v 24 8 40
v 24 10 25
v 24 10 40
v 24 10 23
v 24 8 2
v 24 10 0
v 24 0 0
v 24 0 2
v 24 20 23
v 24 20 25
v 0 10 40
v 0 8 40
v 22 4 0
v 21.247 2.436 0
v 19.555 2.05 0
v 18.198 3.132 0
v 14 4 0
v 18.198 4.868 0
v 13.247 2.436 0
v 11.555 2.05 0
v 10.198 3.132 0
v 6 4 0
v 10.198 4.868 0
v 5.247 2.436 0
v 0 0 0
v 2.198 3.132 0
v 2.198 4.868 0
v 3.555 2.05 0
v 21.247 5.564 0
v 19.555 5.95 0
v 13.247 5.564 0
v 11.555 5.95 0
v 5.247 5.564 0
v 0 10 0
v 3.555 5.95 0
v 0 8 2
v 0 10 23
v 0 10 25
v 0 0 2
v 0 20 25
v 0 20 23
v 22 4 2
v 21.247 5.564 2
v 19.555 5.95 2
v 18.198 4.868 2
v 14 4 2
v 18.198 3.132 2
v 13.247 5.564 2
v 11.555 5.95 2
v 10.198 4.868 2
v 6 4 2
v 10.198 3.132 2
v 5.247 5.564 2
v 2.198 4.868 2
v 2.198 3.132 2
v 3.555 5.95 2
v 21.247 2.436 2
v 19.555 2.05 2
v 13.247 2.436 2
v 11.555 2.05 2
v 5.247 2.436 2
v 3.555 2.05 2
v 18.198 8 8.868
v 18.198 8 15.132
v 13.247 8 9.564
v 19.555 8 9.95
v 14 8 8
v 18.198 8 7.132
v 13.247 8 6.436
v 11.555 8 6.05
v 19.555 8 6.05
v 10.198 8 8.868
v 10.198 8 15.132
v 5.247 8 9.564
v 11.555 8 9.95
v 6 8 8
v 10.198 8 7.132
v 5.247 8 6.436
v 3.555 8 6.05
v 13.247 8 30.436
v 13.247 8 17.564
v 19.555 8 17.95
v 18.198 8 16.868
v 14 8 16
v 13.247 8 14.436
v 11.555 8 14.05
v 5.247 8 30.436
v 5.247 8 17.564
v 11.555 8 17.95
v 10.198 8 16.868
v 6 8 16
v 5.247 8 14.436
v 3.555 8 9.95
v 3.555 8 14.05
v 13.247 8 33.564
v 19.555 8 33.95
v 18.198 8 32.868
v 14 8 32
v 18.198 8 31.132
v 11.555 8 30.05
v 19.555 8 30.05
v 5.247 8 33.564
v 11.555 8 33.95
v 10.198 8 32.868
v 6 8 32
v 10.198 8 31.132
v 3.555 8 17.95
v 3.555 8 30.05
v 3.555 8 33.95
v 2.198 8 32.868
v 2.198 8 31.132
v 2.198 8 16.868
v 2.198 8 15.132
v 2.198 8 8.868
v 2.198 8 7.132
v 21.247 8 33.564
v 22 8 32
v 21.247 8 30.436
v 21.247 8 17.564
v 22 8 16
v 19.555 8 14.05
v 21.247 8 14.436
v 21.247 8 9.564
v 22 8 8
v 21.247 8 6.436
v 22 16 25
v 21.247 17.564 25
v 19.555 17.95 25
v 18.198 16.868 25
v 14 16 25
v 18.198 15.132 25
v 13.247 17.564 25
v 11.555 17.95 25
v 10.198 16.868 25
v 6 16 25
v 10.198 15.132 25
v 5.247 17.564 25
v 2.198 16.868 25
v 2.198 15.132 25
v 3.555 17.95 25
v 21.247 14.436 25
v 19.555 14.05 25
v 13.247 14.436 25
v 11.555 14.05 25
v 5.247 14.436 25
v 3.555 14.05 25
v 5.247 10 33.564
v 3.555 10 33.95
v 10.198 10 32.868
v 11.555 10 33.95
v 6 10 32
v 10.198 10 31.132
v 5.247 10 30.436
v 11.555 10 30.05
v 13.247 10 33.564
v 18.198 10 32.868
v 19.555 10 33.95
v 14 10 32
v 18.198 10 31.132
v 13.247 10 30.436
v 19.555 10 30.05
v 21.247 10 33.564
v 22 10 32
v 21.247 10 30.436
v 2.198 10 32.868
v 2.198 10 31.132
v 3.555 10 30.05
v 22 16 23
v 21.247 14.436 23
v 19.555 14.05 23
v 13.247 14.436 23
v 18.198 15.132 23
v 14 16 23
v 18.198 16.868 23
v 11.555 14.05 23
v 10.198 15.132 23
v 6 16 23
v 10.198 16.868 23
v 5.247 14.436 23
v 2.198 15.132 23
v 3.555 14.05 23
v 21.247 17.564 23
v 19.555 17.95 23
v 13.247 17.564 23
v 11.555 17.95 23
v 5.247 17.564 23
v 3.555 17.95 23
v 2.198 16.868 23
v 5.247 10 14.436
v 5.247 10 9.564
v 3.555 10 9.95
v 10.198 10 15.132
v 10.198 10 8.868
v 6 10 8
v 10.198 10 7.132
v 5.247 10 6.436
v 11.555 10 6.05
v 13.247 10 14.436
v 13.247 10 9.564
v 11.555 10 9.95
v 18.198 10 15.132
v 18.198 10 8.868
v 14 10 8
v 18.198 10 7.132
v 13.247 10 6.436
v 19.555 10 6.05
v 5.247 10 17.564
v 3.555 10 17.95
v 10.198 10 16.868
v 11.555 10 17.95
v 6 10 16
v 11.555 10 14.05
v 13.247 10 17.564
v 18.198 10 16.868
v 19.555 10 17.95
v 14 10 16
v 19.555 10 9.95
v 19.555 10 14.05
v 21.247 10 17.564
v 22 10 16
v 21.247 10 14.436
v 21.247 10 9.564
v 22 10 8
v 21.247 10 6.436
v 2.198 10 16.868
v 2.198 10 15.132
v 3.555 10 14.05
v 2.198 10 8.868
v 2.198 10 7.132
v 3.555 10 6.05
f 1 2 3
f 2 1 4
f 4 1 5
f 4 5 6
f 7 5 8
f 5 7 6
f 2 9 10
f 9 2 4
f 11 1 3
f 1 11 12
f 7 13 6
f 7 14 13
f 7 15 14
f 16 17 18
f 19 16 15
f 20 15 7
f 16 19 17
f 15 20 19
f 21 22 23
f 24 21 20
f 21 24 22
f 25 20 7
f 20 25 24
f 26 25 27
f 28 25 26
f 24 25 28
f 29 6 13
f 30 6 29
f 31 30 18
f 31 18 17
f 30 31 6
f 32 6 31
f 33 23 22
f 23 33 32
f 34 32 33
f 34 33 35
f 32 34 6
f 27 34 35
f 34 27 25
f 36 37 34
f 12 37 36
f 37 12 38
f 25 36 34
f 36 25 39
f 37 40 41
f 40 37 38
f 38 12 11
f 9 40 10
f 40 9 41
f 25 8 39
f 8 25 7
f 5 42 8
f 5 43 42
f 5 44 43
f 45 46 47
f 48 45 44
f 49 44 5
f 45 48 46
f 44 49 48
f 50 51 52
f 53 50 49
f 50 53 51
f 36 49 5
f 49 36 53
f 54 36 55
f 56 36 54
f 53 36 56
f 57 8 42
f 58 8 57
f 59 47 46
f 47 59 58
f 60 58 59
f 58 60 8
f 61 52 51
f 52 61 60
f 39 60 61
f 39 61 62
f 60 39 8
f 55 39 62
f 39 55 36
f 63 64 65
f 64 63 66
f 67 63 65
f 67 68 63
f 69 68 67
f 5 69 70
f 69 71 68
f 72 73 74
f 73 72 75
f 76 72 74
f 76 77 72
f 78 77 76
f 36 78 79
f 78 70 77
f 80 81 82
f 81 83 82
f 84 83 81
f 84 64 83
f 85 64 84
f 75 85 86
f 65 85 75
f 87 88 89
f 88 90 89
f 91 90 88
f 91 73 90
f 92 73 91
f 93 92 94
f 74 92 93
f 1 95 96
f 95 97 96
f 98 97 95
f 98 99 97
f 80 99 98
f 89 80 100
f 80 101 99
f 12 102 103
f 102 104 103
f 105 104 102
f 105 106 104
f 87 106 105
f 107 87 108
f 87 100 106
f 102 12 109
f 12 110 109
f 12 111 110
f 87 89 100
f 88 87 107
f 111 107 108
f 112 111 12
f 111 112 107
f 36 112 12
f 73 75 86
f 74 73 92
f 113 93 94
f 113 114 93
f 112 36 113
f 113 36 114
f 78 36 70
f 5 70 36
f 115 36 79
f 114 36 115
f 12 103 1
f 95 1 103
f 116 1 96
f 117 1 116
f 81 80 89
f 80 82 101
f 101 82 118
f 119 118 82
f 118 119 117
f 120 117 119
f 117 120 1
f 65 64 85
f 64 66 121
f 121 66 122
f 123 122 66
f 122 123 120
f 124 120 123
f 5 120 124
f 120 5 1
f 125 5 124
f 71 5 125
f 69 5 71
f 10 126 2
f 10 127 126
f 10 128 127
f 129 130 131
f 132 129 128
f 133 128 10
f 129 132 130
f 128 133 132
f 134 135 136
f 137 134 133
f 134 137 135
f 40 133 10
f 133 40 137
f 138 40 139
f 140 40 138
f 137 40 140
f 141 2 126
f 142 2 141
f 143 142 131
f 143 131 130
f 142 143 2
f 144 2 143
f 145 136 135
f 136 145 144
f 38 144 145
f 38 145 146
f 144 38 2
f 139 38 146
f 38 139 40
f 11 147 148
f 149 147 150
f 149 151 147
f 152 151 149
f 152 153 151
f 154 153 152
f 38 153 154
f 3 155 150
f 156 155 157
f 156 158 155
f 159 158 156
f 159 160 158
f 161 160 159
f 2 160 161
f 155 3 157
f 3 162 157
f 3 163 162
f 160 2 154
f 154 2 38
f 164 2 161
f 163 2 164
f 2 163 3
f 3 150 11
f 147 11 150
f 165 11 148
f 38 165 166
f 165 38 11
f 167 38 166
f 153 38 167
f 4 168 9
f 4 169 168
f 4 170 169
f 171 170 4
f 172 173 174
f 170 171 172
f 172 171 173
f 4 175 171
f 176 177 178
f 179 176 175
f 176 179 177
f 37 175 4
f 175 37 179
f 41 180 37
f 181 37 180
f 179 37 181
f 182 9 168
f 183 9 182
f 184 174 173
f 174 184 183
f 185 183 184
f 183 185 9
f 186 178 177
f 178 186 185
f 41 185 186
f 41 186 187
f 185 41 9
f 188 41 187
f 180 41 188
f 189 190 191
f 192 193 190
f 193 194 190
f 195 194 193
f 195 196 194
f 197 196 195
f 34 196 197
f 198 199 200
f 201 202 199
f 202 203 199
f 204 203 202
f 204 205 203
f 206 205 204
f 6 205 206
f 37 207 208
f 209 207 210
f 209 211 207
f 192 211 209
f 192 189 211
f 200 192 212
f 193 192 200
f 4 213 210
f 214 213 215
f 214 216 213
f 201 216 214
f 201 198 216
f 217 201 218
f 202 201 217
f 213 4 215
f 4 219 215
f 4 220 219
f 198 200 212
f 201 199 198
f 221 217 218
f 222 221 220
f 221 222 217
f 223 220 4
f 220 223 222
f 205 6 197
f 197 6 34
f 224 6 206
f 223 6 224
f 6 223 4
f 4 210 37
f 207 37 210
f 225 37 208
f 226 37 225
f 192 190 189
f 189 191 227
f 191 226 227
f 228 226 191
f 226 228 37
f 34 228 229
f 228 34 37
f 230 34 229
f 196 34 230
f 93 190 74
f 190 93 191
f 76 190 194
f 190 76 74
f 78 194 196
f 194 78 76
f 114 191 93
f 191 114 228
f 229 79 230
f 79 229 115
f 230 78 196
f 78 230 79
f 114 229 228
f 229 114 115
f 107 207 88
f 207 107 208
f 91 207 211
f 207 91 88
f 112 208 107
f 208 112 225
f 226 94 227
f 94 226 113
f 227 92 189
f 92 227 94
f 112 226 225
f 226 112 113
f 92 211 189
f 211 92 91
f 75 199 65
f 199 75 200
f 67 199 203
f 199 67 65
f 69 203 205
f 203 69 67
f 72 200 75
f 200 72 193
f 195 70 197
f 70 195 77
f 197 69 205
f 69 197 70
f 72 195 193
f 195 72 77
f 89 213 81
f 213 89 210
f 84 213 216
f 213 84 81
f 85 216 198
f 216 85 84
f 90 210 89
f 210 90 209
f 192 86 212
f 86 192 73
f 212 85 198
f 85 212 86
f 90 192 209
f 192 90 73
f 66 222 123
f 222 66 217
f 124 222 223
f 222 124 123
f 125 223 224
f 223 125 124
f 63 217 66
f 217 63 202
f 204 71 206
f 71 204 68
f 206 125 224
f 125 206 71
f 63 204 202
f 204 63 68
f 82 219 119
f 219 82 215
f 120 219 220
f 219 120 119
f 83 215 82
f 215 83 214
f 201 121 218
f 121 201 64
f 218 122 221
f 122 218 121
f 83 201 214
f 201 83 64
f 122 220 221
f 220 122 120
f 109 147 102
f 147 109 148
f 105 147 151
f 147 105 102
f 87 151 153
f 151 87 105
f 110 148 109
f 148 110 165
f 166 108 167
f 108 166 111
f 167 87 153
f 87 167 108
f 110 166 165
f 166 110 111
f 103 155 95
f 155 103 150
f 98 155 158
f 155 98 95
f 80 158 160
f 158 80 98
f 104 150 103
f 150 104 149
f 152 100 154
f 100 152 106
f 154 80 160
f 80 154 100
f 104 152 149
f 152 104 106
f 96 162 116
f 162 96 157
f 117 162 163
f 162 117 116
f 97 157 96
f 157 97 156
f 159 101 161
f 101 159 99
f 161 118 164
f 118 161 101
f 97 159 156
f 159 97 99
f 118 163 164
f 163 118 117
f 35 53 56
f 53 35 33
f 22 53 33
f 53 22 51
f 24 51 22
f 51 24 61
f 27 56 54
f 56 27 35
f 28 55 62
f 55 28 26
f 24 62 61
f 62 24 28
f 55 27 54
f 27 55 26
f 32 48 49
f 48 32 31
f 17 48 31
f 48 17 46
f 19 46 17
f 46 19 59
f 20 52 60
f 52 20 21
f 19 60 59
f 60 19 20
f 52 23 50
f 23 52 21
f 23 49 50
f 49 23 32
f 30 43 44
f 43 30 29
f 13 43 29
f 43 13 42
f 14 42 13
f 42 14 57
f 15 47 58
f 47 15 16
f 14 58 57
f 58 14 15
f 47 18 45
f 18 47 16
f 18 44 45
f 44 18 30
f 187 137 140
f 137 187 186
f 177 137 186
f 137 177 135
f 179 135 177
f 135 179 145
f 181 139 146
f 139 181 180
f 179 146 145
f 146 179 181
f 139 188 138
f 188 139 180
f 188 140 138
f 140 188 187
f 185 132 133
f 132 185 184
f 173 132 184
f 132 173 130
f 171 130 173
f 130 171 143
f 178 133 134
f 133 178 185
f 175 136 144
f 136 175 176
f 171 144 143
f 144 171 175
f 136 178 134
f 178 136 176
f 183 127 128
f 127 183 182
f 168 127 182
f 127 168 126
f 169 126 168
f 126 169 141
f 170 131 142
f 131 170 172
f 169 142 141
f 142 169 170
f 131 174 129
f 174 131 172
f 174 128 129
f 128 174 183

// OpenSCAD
largeur = 3;
hauteur = 5;
epaisseur = 2;
difference(){
difference(){
    cube([largeur*8, 20, hauteur*8]);
    translate([-1,-1,epaisseur]){
        cube([largeur*8+2, 8+1, hauteur*8]);
    };
    translate([-1,8+epaisseur,24+epaisseur/2]){
        cube([largeur*8+2, 8+epaisseur+2, 24+epaisseur/2]);
    };
    translate([-1,8+epaisseur,-1]){
        cube([largeur*8+2, 8+epaisseur+2, 24-epaisseur/2+1]);
    };
};


union(){
for(i=[0:largeur]){
    for(j=[0:1]){
      
        translate([4+i*8, 12, 8+j*8]){
            rotate([90,0,0]){
            cylinder(h=4, r= 2);
            }
        }
    };
    for(j=[3:hauteur-2]){
      
        translate([4+i*8, 12, 8+j*8]){
            rotate([90,0,0]){
            cylinder(h=4, r= 2);
            }
        }
    }
    
    
    }
};
union(){
    for(i=[0:largeur]){
        translate([4+i*8, 4, 0]){
            cylinder(h=4, r=2);
            }
    }
};

union(){
    for(i=[0:largeur]){
        translate([4+i*8, 16, 0]){
            cylinder(h=32, r=2);
            }
    }
};

}
